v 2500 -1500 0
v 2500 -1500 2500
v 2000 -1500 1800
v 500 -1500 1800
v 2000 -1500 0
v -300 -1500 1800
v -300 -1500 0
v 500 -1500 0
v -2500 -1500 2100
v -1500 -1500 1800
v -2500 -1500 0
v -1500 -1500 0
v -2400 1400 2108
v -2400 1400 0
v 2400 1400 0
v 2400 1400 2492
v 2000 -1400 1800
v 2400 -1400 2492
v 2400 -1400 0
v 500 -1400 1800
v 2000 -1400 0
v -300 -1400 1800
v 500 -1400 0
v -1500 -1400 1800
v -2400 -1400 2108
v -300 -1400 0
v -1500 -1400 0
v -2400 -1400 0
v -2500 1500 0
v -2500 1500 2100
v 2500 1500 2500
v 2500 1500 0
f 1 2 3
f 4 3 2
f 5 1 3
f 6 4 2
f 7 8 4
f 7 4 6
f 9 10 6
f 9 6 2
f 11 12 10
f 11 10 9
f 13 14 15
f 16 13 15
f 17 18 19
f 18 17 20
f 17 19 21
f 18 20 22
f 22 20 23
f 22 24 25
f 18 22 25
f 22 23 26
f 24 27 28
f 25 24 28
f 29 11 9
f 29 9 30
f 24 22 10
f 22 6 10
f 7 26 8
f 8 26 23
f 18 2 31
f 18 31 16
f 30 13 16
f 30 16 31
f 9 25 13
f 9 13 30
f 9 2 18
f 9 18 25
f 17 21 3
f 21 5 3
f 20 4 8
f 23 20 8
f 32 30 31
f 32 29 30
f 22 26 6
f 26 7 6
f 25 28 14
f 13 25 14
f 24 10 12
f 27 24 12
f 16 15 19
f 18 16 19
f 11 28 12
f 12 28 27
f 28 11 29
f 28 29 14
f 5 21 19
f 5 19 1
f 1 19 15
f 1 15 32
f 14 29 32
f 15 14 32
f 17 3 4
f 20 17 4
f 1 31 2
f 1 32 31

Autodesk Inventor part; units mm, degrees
ref_plane "YZ Plane" through (0, 0, 0) normal (1, 0, 0) x (0, 1, 0)
ref_plane "XZ Plane" through (0, 0, 0) normal (0, 1, 0) x (-1, 0, 0)
ref_plane "XY Plane" through (0, 0, 0) normal (0, 0, 1) x (1, 0, 0)
ref_plane "Arbeitsebene1" through (0, 0, 0) normal (0, 0, 1) x (1, 0, 0)
sketch "Skizze1" plane through (0, 0, 0) normal (0, 0, 1) x (1, 0, 0)
  line L0 (-2500, 1500) -> (2500, 1500) projected
  line L1 (-2500, -1500) -> (-2500, 1500) projected
  line L2 (2500, -1500) -> (-2500, -1500) projected
  line L3 (2500, 1500) -> (2500, -1500) projected
  line L4 (-2400, 1400) -> (2400, 1400)
  line L5 (2400, 1400) -> (2400, -1400)
  line L6 (2400, -1400) -> (-2400, -1400)
  line L7 (-2400, -1400) -> (-2400, 1400)
  dimension "d0" = 100
extrude "Extrusion1" add sketch "Skizze1" along normal blind 2500
sketch "Skizze3" plane through (-2500, -1500, 0) normal (0, -1, 0) x (1, 0, 0)
  line L0 (5000, 0) -> (0, 0) projected
  line L1 (5000, 0) -> (5000, 2500) projected
  line L2 (0, 2500) -> (5000, 2500) projected
  line L3 (0, 0) -> (0, 2500) projected
  line L4 (5000, 0) -> (5000, 2500) projected
  line L5 (5000, 2500) -> (0, 2100)
  line L6 (0, 0) -> (0, 2500) projected
  line L7 (0, 2500) -> (0, 2100)
  line L8 (0, 2500) -> (5000, 2500) projected
  line L9 (0, 2500) -> (5000, 2500)
  dimension "d11" = 400
extrude "Extrusion3" cut sketch "Skizze3" against normal up to surface (3000 mm away) contours L5 L3 L2
sketch "Skizze2" plane through (-2500, -1500, 0) normal (0, -1, 0) x (1, 0, 0)
  line L0 (5000, 0) -> (0, 0) projected
  line L1 (5000, 0) -> (5000, 2500) projected
  line L2 (0, 0) -> (0, 2100) projected
  line L3 (1000, 0) -> (2200, 0)
  line L4 (2200, 0) -> (2200, 1800)
  line L5 (2200, 1800) -> (1000, 1800)
  line L6 (1000, 1800) -> (1000, 0)
  line L7 (0, 0) -> (5000, 0) projected
  line L8 (3000, 0) -> (4500, 0)
  line L9 (4500, 0) -> (4500, 1800)
  line L10 (4500, 1800) -> (3000, 1800)
  line L11 (3000, 1800) -> (3000, 0)
  line L12 (5000, 2500) -> (0, 2100) projected
  dimension "d3" = 1800
  dimension "d4" = 1500
  dimension "d5" = 1200
  dimension "d6" = 500
  dimension "d7" = 1000
extrude "Extrusion2" cut sketch "Skizze2" against normal blind 396.5 contours L0 L11 L10 L9 | L0 L6 L5 L4
properties part number "Wände" material "Beton"
